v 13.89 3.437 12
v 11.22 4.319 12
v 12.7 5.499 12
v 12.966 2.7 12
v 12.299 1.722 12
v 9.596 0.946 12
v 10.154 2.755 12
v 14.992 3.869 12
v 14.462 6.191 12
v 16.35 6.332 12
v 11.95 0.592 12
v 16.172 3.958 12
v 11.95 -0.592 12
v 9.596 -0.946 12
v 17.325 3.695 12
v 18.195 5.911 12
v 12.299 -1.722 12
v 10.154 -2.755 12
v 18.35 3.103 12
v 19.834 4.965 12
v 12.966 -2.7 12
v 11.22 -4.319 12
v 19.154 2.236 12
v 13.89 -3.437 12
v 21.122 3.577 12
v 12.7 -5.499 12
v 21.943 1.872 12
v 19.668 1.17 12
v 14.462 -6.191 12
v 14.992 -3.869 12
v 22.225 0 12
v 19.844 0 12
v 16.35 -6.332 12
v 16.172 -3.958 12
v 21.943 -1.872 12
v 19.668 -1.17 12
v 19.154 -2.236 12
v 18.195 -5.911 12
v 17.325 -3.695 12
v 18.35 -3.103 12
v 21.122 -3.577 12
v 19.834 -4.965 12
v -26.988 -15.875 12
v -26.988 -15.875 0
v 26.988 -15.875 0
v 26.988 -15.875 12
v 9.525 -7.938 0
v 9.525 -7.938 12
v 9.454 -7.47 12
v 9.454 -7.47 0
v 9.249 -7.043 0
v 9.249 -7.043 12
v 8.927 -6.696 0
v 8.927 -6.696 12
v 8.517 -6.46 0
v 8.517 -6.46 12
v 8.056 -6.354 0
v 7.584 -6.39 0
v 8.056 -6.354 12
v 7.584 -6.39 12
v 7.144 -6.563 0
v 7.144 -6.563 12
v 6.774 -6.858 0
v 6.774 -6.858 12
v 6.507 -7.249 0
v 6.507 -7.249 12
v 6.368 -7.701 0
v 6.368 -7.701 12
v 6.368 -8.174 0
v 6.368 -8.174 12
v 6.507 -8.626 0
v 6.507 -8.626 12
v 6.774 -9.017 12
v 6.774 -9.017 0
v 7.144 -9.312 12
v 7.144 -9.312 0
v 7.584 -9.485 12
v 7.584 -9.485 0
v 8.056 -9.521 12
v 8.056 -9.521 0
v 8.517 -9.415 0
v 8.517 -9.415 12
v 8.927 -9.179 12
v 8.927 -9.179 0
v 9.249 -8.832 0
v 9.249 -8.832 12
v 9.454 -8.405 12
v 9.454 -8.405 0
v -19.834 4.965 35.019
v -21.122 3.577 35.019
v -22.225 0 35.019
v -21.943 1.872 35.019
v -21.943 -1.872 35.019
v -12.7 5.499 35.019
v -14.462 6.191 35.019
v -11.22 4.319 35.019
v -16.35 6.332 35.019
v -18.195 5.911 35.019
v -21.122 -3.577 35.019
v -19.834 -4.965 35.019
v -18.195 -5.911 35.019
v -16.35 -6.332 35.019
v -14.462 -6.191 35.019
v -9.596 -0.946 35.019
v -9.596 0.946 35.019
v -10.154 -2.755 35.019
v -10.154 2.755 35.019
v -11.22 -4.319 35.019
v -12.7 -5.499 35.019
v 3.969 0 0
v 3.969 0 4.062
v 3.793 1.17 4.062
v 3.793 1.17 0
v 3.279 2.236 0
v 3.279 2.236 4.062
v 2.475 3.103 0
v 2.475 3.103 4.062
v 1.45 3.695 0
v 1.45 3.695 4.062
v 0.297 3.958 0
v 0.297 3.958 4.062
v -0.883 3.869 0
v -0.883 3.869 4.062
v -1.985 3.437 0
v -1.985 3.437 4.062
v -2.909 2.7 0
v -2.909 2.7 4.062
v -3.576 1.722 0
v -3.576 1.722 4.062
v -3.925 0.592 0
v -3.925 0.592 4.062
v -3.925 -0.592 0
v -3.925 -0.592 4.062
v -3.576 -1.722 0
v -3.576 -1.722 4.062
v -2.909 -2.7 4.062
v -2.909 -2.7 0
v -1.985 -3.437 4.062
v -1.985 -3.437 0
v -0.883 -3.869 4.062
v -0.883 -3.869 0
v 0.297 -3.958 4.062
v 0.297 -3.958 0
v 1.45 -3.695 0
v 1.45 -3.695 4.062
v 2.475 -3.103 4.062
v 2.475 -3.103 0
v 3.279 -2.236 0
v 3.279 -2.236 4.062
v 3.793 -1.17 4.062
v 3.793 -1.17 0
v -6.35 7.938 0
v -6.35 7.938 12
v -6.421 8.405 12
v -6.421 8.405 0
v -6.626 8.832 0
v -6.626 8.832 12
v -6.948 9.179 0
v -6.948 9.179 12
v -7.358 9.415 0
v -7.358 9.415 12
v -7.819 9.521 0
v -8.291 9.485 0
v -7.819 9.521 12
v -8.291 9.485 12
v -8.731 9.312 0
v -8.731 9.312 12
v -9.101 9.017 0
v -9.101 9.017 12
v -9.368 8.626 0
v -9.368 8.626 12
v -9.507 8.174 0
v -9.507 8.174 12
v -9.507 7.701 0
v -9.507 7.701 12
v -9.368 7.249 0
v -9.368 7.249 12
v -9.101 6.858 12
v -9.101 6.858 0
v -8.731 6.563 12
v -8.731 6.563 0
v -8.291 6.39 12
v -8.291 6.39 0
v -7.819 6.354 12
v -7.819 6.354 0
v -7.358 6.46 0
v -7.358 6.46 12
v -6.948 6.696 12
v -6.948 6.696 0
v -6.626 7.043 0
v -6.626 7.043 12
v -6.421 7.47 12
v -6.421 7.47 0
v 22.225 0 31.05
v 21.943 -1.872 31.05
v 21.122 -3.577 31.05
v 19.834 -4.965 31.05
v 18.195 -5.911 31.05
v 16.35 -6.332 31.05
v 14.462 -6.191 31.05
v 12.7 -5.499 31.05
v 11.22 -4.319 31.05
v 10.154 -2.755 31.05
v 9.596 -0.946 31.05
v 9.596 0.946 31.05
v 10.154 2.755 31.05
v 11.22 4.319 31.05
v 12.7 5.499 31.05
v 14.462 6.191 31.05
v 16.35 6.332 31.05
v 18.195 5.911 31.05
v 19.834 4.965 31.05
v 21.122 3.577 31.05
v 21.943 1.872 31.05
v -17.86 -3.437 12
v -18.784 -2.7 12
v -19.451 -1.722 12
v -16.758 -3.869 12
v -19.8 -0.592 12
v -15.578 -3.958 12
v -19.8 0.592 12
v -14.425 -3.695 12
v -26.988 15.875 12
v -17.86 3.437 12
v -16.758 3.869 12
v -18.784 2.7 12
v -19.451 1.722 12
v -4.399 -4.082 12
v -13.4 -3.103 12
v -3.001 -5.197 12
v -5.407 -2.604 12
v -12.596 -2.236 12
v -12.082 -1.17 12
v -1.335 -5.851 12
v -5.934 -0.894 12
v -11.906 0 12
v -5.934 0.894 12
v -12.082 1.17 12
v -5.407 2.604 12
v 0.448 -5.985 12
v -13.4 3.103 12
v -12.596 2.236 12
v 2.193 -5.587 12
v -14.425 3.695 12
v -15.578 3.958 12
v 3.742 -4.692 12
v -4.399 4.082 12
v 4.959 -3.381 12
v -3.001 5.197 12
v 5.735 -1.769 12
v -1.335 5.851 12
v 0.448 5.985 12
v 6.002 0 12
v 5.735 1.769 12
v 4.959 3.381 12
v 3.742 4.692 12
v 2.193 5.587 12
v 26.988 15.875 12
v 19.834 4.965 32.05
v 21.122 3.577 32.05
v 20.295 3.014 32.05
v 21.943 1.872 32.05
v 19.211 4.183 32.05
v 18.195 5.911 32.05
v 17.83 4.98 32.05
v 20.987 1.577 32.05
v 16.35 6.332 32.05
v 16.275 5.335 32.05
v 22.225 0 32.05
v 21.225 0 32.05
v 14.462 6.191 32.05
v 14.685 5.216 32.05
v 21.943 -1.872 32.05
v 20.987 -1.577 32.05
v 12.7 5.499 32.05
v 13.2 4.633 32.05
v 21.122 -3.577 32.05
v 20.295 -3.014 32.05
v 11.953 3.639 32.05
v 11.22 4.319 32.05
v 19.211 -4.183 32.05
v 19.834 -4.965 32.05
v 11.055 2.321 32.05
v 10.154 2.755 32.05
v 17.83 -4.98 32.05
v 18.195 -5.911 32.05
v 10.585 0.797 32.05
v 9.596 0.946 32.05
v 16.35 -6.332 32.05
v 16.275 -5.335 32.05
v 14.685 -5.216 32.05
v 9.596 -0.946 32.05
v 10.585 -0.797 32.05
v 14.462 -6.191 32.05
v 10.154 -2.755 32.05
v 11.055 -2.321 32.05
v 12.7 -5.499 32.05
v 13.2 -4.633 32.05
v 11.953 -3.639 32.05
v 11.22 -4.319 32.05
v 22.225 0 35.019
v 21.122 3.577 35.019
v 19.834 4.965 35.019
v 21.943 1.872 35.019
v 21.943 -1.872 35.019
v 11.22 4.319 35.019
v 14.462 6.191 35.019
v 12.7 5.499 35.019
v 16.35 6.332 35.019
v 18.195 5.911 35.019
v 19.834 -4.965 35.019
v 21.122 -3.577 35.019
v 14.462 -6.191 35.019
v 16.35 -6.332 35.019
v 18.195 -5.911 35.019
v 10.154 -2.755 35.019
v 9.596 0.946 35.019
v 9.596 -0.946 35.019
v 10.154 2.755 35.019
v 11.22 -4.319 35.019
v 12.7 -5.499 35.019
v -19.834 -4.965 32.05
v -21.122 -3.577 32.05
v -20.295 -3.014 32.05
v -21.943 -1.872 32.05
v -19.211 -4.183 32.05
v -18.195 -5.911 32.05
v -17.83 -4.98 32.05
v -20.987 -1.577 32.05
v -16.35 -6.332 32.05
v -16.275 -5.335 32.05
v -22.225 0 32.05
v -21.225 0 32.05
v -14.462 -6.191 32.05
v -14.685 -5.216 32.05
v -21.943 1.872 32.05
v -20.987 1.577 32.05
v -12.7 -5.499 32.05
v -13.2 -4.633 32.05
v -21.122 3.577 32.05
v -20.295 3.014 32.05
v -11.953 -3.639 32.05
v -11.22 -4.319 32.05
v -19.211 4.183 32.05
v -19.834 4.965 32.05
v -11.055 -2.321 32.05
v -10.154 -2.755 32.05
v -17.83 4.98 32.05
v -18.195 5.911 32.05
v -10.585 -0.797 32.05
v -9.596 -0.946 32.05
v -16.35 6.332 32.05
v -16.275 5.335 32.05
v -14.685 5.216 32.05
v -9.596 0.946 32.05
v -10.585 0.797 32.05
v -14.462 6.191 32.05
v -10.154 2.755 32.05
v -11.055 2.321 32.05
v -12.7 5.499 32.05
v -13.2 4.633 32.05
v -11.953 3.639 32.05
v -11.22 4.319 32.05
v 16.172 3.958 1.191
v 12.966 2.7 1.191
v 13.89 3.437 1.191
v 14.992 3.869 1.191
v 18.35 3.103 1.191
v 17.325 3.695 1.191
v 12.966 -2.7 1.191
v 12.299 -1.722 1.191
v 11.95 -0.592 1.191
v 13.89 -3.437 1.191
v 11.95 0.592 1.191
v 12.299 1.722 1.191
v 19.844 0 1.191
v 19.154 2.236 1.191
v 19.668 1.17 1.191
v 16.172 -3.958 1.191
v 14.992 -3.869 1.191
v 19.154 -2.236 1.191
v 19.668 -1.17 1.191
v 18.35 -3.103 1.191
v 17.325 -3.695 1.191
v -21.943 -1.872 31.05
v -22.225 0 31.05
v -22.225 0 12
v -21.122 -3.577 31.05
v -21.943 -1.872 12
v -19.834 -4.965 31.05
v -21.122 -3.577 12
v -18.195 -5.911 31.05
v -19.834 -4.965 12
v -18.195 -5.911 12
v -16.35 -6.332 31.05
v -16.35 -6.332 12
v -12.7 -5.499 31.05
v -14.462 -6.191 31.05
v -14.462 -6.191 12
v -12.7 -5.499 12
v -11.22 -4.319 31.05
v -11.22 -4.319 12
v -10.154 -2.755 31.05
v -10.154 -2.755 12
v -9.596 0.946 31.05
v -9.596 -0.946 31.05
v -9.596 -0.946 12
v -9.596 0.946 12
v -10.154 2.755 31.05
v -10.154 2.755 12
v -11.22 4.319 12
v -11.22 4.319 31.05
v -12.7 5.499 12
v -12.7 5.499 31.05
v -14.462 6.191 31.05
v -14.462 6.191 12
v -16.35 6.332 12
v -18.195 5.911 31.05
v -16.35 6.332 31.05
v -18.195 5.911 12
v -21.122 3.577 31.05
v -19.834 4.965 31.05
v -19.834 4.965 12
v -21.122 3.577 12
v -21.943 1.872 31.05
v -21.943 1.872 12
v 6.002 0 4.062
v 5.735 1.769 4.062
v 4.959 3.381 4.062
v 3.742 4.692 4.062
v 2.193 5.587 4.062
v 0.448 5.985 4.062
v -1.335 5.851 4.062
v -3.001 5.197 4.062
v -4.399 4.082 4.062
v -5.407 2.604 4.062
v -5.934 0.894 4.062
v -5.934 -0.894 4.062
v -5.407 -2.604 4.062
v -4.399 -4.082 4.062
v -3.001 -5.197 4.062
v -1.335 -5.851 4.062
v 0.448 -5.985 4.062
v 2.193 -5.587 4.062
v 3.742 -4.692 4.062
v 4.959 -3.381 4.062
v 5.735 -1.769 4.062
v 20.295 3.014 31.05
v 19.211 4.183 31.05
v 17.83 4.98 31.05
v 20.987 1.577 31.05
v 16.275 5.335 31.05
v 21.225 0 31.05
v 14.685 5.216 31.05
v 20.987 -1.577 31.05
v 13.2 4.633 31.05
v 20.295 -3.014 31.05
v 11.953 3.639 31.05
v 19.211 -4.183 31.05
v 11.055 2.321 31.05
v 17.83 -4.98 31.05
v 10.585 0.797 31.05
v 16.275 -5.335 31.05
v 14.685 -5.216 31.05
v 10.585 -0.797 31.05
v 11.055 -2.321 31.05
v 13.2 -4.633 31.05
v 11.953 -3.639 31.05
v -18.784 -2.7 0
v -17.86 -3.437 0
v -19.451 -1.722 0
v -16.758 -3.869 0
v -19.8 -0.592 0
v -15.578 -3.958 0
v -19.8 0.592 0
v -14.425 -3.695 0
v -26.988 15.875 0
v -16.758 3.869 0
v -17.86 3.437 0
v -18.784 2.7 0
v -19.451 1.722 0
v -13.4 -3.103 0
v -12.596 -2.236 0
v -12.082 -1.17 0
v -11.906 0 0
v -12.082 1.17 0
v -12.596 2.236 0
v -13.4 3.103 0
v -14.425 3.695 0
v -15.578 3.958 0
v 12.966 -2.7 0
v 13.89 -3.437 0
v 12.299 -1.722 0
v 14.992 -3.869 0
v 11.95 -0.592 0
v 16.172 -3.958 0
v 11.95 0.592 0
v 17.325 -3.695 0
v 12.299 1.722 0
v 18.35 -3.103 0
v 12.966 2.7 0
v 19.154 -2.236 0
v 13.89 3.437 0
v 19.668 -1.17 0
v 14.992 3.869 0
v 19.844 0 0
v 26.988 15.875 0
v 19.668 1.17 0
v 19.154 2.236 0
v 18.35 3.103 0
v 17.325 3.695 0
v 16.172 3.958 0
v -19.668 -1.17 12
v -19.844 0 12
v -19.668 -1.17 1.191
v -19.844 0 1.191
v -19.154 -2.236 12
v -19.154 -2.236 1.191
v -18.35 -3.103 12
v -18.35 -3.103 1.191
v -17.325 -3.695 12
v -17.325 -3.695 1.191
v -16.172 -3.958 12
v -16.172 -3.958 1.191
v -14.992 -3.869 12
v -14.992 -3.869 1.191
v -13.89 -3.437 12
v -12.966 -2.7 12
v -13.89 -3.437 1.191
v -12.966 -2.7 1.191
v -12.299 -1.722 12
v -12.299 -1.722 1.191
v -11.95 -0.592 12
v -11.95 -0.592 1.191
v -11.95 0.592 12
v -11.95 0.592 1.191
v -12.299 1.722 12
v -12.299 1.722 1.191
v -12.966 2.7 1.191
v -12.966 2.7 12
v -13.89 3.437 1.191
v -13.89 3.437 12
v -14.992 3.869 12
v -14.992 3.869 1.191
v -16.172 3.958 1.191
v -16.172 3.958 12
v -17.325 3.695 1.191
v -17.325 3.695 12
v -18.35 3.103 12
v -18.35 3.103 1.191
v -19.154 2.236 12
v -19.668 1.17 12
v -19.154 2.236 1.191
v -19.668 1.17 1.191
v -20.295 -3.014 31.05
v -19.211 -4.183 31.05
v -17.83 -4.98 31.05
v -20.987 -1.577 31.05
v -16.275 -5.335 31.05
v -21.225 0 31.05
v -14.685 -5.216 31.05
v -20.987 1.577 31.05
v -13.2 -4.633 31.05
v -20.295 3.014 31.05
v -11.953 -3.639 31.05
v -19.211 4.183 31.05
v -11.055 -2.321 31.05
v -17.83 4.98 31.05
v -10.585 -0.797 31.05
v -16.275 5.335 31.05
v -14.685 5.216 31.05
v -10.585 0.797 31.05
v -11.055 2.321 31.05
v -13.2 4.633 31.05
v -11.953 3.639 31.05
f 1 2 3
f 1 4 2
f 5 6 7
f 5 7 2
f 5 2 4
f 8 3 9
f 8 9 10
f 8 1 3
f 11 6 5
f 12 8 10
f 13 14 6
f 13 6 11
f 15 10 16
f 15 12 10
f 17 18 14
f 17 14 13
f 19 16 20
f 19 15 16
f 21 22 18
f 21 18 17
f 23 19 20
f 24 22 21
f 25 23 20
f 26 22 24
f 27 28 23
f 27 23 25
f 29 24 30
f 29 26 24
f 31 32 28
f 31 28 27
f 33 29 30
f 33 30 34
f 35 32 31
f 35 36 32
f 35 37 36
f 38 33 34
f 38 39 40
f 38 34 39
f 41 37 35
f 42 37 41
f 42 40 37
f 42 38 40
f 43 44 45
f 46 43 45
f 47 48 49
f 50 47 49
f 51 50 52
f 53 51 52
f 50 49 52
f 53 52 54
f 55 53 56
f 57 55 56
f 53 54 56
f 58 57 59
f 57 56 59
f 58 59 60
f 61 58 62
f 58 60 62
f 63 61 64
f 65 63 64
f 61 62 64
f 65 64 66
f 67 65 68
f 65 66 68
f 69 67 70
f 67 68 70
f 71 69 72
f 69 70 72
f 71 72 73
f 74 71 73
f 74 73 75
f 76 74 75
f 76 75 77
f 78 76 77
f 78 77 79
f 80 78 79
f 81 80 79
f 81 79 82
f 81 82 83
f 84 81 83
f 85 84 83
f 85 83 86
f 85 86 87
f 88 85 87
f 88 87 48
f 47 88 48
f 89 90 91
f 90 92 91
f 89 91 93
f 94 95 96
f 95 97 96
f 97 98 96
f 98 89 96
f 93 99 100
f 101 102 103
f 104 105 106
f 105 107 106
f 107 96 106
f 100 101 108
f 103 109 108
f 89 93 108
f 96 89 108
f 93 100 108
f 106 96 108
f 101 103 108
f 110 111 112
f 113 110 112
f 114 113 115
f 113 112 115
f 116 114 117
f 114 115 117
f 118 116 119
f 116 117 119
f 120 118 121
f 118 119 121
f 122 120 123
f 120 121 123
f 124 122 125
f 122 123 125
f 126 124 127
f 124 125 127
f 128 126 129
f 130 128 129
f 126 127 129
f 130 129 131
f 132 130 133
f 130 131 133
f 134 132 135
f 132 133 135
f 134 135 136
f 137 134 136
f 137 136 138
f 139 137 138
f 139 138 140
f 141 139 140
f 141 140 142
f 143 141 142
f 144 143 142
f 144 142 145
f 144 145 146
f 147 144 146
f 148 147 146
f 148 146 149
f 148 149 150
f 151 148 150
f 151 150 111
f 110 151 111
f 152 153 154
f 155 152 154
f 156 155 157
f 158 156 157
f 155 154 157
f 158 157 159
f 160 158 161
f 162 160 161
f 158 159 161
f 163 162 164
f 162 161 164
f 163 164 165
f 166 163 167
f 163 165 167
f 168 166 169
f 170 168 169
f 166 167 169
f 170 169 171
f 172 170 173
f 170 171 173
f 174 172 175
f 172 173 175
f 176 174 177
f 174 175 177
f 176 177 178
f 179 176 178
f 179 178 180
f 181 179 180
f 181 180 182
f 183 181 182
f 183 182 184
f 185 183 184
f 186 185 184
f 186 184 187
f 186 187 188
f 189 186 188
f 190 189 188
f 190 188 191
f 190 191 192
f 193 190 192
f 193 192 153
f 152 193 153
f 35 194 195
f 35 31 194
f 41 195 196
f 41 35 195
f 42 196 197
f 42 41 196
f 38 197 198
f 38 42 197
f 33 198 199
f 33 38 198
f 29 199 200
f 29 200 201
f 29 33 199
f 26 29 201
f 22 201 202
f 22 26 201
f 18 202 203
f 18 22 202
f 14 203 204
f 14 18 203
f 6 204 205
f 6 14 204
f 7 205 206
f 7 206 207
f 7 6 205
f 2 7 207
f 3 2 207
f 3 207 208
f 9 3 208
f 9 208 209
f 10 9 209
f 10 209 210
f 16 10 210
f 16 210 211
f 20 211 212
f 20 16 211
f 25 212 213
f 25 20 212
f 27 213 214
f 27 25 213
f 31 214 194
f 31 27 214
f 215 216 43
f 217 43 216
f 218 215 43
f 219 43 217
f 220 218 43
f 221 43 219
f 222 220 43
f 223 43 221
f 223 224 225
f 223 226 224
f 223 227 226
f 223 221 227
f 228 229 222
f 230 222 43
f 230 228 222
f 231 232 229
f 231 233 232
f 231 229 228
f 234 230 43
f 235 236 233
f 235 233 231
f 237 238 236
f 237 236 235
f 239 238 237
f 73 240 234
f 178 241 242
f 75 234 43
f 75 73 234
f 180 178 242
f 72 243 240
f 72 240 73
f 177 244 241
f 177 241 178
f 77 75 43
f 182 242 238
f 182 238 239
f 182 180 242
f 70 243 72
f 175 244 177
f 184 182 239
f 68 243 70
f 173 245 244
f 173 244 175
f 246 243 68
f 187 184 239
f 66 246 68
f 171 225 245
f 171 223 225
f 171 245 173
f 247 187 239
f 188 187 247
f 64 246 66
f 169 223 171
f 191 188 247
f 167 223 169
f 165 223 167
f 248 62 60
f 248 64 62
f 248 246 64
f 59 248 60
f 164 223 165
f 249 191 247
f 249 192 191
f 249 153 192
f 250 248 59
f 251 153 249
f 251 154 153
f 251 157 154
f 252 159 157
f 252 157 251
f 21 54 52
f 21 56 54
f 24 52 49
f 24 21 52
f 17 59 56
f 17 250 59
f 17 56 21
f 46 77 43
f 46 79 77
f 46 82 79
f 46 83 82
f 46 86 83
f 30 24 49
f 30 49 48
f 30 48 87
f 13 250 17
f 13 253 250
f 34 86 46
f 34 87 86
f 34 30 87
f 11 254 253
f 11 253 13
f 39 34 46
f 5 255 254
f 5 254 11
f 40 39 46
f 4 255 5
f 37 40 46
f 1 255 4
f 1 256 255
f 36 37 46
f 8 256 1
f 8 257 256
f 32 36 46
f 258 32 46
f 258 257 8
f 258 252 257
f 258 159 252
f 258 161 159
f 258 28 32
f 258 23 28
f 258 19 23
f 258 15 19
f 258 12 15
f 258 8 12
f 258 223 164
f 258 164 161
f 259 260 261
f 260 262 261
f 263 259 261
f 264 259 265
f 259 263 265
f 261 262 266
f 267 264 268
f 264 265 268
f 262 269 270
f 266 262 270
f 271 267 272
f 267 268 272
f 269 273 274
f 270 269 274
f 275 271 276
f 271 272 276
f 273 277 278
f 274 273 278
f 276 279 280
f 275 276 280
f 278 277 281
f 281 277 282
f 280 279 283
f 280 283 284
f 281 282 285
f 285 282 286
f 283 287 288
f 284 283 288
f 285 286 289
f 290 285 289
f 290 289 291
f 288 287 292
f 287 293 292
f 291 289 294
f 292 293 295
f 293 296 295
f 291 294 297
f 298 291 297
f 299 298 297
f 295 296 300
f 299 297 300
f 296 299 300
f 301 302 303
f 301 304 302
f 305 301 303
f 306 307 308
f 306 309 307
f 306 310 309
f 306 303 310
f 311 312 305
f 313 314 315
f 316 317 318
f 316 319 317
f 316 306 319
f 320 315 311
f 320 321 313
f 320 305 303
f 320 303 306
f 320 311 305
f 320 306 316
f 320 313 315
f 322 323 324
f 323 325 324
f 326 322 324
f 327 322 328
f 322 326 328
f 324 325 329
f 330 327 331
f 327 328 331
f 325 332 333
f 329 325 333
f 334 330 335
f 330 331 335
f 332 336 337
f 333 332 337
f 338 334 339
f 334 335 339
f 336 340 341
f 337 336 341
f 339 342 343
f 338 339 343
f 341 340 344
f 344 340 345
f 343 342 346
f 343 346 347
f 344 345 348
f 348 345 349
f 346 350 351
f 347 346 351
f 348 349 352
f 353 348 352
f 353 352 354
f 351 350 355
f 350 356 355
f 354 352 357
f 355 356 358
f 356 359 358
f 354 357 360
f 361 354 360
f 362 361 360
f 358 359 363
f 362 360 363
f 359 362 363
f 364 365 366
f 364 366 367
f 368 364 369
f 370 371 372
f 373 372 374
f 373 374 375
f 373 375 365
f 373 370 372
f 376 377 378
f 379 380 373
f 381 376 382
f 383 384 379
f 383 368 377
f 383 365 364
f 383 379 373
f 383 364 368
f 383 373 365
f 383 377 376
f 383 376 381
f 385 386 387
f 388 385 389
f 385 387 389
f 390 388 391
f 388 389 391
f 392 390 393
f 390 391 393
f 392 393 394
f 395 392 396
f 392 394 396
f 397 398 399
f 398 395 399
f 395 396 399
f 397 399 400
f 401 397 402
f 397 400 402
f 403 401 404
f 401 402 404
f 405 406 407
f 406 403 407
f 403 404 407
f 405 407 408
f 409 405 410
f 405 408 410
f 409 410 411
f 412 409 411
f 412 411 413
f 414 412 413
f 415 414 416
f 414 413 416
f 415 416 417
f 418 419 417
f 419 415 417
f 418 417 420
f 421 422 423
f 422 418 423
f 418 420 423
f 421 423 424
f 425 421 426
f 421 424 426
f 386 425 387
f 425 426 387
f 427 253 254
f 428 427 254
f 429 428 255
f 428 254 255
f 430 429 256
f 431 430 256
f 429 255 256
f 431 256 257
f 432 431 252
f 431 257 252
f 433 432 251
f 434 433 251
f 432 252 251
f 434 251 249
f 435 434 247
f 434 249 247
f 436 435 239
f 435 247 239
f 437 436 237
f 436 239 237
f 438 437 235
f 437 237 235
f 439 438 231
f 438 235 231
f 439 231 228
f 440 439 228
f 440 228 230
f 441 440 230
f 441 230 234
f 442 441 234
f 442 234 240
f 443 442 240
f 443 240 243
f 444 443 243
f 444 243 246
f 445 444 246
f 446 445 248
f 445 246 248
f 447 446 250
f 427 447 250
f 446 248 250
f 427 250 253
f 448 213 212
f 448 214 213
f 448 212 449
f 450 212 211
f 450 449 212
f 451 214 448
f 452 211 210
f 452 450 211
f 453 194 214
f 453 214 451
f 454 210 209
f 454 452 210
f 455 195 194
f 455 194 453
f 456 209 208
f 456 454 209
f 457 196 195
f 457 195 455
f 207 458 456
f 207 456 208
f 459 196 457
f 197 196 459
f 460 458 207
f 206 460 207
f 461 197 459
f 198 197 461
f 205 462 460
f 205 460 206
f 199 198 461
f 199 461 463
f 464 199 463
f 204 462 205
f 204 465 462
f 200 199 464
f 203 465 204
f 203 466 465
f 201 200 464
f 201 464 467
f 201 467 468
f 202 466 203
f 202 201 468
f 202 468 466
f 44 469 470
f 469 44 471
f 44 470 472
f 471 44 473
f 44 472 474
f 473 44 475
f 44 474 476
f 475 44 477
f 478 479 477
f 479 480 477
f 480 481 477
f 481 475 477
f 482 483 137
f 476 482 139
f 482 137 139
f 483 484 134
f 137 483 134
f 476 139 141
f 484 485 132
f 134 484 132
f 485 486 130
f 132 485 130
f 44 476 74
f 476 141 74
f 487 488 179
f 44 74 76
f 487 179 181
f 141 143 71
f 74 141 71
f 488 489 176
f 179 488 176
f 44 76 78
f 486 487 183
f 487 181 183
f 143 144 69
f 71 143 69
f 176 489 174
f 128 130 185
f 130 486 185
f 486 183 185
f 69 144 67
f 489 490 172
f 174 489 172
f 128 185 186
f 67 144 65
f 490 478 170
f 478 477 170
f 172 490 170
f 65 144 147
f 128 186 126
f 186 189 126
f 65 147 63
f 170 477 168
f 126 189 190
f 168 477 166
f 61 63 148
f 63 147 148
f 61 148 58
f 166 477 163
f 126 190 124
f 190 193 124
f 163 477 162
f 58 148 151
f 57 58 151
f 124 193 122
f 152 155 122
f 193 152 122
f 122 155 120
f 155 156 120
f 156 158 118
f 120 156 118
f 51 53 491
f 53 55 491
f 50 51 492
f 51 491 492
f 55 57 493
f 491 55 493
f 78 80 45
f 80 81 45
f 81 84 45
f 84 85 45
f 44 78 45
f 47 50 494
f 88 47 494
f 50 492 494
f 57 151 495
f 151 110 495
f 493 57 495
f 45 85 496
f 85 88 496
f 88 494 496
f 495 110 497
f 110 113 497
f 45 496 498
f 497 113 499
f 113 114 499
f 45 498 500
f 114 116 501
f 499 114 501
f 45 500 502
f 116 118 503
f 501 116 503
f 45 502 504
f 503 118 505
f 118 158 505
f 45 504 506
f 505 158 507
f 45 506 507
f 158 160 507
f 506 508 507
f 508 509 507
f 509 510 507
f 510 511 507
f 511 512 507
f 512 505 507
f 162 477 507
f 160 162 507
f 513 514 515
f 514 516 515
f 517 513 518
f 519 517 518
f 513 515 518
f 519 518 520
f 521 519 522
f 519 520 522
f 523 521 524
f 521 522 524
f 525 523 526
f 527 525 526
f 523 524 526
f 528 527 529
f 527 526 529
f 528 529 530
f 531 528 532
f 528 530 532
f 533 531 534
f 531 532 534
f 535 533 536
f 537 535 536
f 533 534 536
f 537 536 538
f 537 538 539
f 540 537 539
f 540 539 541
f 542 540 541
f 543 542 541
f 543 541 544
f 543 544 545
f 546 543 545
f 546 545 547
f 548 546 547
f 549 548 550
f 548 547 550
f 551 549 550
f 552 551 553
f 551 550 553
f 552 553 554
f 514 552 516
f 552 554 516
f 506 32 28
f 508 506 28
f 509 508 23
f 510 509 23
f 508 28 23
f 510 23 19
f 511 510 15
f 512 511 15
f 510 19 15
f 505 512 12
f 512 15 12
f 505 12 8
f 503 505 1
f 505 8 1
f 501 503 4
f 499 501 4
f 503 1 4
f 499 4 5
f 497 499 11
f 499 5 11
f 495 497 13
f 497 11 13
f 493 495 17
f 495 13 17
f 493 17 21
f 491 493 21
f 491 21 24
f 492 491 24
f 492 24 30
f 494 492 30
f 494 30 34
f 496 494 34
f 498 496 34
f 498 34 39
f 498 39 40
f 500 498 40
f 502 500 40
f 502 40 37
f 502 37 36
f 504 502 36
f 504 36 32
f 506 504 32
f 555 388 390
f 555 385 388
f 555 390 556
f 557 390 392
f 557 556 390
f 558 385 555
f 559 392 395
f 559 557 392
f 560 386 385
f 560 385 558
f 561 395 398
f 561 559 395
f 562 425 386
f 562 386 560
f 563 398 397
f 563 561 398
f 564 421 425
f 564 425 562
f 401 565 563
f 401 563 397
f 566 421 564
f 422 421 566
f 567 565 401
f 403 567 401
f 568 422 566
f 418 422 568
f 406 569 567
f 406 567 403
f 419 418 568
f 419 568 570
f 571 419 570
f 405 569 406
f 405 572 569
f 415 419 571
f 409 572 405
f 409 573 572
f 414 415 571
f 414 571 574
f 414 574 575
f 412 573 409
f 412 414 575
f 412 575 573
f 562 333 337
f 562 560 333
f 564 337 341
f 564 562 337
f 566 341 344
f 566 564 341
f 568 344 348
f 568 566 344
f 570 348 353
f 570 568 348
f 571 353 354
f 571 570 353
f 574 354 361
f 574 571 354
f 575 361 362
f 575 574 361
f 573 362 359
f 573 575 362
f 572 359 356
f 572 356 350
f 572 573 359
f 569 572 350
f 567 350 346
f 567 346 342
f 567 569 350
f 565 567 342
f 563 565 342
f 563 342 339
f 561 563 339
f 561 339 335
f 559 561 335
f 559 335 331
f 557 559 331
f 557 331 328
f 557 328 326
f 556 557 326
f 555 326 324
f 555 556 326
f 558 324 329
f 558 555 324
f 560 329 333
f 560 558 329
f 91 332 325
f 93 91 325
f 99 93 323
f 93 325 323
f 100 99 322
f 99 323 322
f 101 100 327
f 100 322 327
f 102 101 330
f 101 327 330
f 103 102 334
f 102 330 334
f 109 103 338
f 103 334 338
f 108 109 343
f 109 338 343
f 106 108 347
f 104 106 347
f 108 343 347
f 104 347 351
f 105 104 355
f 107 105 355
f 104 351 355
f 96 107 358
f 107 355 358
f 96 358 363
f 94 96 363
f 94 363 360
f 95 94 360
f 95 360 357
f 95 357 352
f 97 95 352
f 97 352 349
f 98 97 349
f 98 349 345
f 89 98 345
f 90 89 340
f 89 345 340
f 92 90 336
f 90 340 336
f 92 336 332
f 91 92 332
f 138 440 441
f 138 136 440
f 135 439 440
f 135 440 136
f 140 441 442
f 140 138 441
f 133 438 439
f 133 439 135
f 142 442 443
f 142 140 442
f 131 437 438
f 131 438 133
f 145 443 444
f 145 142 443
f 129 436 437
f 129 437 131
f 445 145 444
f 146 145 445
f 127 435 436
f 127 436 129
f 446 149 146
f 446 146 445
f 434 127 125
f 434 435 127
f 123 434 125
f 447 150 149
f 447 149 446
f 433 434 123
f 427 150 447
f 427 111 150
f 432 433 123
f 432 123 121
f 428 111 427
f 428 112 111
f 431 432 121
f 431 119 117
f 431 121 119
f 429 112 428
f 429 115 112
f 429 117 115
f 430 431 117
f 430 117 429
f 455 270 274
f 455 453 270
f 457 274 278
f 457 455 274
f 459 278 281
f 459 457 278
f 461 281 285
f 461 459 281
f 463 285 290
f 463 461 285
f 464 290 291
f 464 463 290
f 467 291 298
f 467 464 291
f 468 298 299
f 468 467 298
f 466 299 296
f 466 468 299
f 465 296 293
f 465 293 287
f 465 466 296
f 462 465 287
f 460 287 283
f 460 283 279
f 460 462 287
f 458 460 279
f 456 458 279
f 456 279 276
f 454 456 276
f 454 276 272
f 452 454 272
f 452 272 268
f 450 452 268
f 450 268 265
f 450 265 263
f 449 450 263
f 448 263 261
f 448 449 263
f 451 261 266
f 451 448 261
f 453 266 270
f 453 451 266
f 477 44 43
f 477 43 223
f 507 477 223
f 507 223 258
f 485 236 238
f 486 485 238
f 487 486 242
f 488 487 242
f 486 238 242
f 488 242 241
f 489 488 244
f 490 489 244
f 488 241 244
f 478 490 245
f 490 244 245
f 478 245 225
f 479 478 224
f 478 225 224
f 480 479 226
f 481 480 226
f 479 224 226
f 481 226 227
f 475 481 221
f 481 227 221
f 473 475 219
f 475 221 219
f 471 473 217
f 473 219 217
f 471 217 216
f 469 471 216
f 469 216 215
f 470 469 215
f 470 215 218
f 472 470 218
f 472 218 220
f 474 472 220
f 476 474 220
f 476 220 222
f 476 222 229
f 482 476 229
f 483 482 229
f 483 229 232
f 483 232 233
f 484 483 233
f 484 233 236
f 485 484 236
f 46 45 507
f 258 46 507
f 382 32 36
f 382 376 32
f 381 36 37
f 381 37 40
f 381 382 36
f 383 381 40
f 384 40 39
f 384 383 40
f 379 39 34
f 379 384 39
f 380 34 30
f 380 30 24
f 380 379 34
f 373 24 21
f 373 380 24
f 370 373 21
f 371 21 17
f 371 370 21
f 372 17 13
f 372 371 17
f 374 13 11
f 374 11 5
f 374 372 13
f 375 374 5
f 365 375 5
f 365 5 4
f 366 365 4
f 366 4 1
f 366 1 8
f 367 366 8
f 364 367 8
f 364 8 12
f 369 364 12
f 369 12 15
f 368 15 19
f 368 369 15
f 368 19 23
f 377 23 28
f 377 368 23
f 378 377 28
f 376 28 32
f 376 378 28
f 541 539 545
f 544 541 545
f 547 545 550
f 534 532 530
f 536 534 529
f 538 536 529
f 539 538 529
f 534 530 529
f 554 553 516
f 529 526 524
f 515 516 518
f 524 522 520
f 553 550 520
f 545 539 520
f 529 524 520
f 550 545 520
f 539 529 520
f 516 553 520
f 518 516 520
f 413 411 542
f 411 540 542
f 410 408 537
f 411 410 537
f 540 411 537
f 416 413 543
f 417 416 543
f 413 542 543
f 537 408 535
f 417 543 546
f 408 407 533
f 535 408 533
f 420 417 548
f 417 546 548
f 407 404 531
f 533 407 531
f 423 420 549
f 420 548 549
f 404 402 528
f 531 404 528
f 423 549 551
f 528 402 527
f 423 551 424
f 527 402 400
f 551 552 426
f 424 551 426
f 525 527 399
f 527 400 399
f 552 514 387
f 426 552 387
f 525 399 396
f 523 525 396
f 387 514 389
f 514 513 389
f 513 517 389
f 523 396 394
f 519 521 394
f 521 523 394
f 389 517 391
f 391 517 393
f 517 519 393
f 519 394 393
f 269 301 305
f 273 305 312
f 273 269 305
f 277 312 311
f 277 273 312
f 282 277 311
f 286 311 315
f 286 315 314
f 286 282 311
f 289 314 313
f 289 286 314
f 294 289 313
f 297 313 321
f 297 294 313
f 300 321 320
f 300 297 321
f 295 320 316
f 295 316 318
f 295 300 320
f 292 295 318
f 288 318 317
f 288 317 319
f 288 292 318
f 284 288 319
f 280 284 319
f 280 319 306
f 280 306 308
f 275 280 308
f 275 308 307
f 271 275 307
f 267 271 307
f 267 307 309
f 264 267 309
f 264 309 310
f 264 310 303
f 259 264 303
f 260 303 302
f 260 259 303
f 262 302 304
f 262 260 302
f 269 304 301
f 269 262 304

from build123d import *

# Parameters (mm, degrees)
CROQUIS1_W              = 53.975
CROQUIS1_H              = 31.75
SALIENTE_EXTRUIR1_DEPTH = 12
CROQUIS2_R              = 3.969
CORTAR_EXTRUIR1_DEPTH   = 34.53119117
CROQUIS3_R              = 6.0015
CORTAR_EXTRUIR2_DEPTH   = 7.938
CROQUIS4_R              = 1.5875
CORTAR_EXTRUIR3_DEPTH   = 34.53119117
CROQUIS5_R              = 3.969
CORTAR_EXTRUIR4_DEPTH   = 34.53119117
CROQUIS12_W             = 1
CROQUIS12_H             = 1
CROQUIS13_W             = 1
CROQUIS13_H             = 1


with BuildPart() as part:
    # Croquis1 → Saliente-Extruir1 (new body)
    with BuildSketch(Plane.XY):
        Rectangle(CROQUIS1_W, CROQUIS1_H)
    extrude(amount=SALIENTE_EXTRUIR1_DEPTH)

    # Croquis2 → Cortar-Extruir1 (cut, through all)
    with BuildSketch(Plane.XY.offset(12)):
        Circle(CROQUIS2_R)
    extrude(amount=-CORTAR_EXTRUIR1_DEPTH, mode=Mode.SUBTRACT)

    # Croquis3 → Cortar-Extruir2 (cut)
    with BuildSketch(Plane.XY.offset(12)):
        Circle(CROQUIS3_R)
    extrude(amount=-CORTAR_EXTRUIR2_DEPTH, mode=Mode.SUBTRACT)

    # Croquis4 → Cortar-Extruir3 (cut, through all)
    with BuildSketch(Plane.XY.offset(12)):
        with Locations((7.9375, -7.9375)):
            Circle(CROQUIS4_R)
        with Locations((-7.9375, 7.9375)):
            Circle(CROQUIS4_R)
    extrude(amount=-CORTAR_EXTRUIR3_DEPTH, mode=Mode.SUBTRACT)

    # Croquis5 → Cortar-Extruir4 (cut, through all)
    with BuildSketch(Plane.XY.offset(12)):
        with Locations((-15.875, 0)):
            Circle(CROQUIS5_R)
        with Locations((15.875, 0)):
            Circle(CROQUIS5_R)
    extrude(amount=-CORTAR_EXTRUIR4_DEPTH, mode=Mode.SUBTRACT)


with BuildPart() as body_2:
    # Croquis6 → Revolución3 (revolve)
    with BuildSketch(Plane(origin=(0, 0, 0), x_dir=(1, 0, 0), z_dir=(0, 1, 0)), mode=Mode.PRIVATE) as revoluci_n3_sk:
        Polygon((-15.875, -1.191), (-15.875, -35.019), (-9.525, -35.019), (-9.525, -12), (-11.906, -12), (-11.906, -1.191), align=None)
    revolve(revoluci_n3_sk.sketch.rotate(Axis((-15.875, 0, 0), (0, 0, 1)), 180), axis=Axis((-15.875, 0, 0), (0, 0, 1)))

    # Croquis12 → Cortar-Revolución3 (revolve, cut)
    with BuildSketch(Plane(origin=(0, 0, 0), x_dir=(1, 0, 0), z_dir=(0, 1, 0)), mode=Mode.PRIVATE) as cortar_revoluci_n3_sk:
        with Locations((-10.025, -31.55)):
            Rectangle(CROQUIS12_W, CROQUIS12_H)
    revolve(cortar_revoluci_n3_sk.sketch.rotate(Axis((-15.875, 0, 35.019), (0, 0, -1)), 180), axis=Axis((-15.875, 0, 35.019), (0, 0, -1)), mode=Mode.SUBTRACT)


with BuildPart() as body_3:
    # Croquis8 → Revolución4 (revolve)
    with BuildSketch(Plane(origin=(0, 0, 0), x_dir=(1, 0, 0), z_dir=(0, 1, 0)), mode=Mode.PRIVATE) as revoluci_n4_sk:
        Polygon((15.875, -1.191), (15.875, -35.019), (9.525, -35.019), (9.525, -12), (11.906, -12), (11.906, -1.191), align=None)
    revolve(revoluci_n4_sk.sketch.rotate(Axis((15.875, 0, 12), (0, 0, -1)), 180), axis=Axis((15.875, 0, 12), (0, 0, -1)))

    # Croquis13 → Cortar-Revolución4 (revolve, cut)
    with BuildSketch(Plane(origin=(0, 0, 0), x_dir=(1, 0, 0), z_dir=(0, 1, 0))):
        with Locations((21.725, -31.55)):
            Rectangle(CROQUIS13_W, CROQUIS13_H)
    revolve(axis=Axis((15.875, 0, 35.019), (0, 0, -1)), mode=Mode.SUBTRACT)


solid = Compound([part.part, body_2.part, body_3.part])
